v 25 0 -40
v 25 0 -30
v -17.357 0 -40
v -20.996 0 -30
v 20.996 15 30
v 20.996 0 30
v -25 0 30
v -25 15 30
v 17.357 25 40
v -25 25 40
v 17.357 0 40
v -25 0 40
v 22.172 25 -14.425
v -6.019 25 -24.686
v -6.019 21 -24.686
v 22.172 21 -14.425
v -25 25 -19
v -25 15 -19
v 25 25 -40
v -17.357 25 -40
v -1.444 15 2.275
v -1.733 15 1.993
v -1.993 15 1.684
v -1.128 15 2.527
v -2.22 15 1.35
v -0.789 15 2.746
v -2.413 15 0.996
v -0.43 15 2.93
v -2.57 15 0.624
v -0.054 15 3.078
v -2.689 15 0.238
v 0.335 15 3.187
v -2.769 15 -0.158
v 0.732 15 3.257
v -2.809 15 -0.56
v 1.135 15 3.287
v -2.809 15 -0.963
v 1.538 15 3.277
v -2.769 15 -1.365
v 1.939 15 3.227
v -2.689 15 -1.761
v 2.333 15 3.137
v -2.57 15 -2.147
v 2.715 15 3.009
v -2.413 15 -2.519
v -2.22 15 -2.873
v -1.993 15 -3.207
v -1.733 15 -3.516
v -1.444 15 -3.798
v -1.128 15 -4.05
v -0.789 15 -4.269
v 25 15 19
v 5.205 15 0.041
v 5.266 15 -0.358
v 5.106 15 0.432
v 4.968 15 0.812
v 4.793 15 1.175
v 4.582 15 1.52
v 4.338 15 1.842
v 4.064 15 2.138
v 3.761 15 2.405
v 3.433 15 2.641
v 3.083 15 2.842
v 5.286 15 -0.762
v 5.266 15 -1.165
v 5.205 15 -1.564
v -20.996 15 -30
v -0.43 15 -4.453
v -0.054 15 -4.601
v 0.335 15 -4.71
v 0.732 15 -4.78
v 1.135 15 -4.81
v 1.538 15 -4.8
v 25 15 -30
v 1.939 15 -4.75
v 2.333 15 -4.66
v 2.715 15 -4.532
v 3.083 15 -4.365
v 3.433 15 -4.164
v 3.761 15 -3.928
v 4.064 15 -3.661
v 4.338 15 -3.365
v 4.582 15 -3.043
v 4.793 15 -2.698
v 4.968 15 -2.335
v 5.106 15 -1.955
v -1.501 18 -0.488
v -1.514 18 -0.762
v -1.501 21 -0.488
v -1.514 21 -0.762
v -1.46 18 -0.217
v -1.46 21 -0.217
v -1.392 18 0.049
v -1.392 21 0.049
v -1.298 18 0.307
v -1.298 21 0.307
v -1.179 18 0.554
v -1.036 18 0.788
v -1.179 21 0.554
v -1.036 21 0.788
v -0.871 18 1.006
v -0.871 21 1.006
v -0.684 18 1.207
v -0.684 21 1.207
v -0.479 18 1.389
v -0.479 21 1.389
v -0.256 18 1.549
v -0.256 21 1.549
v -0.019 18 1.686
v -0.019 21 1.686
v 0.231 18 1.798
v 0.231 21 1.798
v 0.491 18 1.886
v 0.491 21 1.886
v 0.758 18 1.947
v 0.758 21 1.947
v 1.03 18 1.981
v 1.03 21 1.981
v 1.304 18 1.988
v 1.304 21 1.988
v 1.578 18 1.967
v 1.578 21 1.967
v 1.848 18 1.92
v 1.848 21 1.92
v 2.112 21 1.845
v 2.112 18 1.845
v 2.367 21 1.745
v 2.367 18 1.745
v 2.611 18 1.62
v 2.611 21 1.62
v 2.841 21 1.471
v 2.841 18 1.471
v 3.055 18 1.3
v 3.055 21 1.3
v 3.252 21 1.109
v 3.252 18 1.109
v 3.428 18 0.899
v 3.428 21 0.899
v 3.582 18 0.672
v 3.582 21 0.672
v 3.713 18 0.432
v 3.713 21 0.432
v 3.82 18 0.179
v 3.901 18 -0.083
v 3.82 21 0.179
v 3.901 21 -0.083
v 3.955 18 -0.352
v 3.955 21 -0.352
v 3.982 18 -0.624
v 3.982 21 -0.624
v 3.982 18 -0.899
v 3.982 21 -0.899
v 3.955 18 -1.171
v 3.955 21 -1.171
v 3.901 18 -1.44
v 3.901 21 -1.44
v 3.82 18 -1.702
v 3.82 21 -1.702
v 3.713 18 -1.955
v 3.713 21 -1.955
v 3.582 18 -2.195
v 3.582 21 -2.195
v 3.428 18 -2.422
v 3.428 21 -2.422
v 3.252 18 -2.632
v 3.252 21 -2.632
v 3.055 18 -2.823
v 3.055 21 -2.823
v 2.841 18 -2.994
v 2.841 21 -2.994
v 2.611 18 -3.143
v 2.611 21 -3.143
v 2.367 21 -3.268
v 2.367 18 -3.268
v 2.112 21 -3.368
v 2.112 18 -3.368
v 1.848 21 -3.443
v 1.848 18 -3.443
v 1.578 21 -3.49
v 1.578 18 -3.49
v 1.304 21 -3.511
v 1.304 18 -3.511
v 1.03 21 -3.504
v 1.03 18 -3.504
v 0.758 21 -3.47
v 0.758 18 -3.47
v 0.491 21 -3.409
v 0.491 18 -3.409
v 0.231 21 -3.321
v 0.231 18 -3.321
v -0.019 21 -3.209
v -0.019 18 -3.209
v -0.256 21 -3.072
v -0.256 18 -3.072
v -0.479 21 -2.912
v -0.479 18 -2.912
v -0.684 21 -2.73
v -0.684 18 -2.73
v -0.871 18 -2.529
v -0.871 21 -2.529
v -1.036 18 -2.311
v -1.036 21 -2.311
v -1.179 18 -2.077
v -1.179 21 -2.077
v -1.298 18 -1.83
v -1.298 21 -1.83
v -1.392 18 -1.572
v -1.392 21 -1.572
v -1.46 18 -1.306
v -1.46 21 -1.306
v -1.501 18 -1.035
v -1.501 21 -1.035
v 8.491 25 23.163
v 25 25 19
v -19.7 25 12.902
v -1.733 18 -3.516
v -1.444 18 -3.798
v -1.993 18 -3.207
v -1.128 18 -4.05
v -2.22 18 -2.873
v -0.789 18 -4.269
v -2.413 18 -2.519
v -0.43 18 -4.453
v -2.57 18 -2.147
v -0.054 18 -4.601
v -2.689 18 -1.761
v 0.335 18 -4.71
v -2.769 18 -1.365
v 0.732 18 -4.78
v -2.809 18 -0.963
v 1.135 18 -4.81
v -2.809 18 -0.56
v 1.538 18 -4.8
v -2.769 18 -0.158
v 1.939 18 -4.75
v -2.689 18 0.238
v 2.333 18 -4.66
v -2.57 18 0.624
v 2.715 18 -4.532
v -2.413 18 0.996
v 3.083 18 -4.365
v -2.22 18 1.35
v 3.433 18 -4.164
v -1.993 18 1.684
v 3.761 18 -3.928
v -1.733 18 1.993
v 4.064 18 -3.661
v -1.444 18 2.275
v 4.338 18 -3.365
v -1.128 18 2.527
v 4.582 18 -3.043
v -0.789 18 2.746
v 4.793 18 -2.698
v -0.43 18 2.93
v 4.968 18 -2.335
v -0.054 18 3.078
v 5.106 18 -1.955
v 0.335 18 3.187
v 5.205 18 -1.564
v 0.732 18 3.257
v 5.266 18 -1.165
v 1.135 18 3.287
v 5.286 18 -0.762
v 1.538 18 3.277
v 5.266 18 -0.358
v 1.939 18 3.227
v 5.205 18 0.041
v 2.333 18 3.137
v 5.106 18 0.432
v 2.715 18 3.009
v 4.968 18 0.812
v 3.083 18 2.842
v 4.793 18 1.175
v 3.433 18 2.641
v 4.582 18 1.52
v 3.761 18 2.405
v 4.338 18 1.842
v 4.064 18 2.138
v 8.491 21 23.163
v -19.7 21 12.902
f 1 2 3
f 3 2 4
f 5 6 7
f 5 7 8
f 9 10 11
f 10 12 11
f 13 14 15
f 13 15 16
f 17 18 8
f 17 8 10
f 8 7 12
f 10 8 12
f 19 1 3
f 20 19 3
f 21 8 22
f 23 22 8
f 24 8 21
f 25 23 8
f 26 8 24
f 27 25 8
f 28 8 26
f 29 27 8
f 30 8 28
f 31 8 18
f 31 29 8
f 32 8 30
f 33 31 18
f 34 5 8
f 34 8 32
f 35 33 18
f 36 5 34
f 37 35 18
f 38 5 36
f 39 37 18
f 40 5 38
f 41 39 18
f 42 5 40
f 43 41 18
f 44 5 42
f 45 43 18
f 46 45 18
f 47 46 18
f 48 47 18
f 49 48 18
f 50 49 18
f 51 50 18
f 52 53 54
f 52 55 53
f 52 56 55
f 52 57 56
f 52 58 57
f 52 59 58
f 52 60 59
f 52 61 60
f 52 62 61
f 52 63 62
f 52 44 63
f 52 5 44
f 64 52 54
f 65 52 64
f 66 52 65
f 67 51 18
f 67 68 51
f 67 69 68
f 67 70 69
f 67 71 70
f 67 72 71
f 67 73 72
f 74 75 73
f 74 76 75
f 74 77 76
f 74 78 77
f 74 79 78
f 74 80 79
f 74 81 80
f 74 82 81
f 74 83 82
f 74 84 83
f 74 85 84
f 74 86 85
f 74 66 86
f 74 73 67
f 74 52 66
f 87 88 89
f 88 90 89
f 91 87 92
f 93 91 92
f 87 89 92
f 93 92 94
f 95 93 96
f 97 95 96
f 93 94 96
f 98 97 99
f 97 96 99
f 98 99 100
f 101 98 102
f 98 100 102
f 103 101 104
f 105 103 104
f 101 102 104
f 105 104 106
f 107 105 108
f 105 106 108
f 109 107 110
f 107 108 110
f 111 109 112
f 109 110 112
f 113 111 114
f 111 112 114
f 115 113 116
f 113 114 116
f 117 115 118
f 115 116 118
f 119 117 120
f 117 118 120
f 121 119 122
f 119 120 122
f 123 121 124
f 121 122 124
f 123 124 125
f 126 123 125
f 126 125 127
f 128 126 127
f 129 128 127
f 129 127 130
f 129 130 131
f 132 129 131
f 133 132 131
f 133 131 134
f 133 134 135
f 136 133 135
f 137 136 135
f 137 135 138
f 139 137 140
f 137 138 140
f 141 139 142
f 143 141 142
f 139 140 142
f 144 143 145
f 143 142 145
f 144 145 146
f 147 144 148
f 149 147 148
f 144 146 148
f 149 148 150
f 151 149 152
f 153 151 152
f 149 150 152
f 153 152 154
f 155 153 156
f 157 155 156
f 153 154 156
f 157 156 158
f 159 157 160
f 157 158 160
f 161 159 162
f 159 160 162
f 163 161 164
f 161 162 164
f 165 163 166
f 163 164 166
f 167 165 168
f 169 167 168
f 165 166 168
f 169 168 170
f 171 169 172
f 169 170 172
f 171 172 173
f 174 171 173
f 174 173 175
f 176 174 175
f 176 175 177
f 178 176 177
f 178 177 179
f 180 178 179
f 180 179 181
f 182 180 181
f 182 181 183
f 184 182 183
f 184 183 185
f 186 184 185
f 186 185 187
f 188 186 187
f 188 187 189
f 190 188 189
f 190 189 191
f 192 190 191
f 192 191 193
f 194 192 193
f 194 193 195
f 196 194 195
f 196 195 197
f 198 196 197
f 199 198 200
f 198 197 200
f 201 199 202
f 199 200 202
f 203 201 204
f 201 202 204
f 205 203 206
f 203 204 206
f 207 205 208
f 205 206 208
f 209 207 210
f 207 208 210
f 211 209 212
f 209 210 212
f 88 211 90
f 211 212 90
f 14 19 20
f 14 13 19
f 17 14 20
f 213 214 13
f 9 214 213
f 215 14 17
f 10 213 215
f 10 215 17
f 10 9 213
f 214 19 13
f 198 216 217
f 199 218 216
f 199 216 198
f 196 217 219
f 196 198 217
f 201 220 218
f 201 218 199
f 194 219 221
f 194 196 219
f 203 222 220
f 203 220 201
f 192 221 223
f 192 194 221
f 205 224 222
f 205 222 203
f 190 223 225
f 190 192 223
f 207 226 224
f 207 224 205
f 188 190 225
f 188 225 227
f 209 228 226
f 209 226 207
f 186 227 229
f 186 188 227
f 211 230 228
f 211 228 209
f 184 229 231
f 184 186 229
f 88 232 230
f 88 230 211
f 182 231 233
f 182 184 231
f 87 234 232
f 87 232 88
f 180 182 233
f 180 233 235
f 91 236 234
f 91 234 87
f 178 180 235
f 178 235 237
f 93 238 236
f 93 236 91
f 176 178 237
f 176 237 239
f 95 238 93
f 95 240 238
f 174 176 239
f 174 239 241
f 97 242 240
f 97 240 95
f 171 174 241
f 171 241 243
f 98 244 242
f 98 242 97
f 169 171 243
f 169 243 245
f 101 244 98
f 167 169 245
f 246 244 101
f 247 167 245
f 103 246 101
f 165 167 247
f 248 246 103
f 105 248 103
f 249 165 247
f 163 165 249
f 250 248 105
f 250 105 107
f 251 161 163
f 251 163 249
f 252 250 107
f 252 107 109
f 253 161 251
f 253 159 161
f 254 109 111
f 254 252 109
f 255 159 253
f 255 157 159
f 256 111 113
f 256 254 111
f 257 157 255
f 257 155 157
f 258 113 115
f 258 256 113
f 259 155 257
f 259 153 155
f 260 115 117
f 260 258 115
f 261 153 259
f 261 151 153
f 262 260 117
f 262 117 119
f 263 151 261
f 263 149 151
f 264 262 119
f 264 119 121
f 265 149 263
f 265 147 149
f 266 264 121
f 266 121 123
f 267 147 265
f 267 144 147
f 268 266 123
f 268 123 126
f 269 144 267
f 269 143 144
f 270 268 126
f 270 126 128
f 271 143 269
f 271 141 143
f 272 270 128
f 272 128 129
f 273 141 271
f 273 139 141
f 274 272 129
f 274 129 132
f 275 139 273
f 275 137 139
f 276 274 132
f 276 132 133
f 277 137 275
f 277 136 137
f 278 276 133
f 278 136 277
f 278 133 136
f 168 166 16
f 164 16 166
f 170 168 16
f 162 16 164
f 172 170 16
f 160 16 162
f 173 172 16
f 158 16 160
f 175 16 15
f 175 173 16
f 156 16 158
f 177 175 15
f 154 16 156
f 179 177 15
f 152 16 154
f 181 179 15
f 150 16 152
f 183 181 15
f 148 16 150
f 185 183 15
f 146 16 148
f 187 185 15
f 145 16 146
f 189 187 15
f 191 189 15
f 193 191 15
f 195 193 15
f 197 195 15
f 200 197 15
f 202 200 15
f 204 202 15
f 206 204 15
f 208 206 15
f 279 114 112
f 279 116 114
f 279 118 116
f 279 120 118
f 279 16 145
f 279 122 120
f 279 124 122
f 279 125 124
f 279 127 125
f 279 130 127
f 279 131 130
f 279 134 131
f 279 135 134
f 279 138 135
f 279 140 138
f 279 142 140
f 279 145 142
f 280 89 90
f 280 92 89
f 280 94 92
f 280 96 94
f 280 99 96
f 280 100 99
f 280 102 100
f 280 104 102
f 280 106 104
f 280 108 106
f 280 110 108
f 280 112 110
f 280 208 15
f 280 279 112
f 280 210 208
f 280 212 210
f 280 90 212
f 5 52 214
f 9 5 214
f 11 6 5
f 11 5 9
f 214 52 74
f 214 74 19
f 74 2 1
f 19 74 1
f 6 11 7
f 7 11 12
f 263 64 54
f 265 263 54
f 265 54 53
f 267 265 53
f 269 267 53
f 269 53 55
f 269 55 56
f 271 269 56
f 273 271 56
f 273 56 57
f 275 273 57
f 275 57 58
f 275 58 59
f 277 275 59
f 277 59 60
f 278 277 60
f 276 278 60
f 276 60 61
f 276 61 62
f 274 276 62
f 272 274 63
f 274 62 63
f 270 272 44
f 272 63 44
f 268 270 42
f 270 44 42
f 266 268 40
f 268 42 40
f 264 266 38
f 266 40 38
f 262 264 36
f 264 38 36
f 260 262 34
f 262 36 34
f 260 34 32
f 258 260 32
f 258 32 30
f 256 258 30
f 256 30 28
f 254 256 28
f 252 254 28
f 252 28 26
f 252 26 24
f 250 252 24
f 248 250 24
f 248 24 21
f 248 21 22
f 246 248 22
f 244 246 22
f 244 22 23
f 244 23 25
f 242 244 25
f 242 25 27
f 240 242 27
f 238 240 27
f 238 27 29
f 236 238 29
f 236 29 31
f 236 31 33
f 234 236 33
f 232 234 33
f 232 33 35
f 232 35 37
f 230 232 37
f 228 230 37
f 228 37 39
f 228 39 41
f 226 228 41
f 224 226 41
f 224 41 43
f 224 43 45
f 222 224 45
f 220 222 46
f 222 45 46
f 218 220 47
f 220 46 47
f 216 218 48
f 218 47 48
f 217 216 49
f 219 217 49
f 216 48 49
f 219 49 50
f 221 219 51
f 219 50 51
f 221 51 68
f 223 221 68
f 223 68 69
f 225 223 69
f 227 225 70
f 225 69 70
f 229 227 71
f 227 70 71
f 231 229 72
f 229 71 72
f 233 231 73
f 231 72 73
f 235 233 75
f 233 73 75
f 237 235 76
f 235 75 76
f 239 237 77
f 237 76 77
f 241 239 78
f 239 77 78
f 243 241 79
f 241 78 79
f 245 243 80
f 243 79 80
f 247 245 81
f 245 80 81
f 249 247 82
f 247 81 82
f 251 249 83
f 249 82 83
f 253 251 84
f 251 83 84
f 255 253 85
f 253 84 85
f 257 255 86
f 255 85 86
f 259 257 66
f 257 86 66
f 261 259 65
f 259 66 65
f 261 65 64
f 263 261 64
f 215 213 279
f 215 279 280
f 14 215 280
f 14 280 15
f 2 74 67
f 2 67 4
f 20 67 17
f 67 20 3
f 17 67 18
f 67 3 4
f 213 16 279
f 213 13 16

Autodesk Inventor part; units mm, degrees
sketch "Sketch1" plane through (0, 0, 0) normal (0, 1, 0) x (-1, 0, 0)
  line L0 (-25, -40) -> (25, -40) construction
  line L1 (25, -40) -> (25, 40) construction
  line L2 (25, 40) -> (-25, 40) construction
  line L3 (-25, 40) -> (-25, -40) construction
  line L4 (-25, 19) -> (-17.3566, 40)
  line L5 (17.3566, -40) -> (25, -19)
  line L6 (25, -19) -> (25, 40)
  line L7 (25, 40) -> (-17.3566, 40)
  line L8 (-25, 19) -> (-25, -40)
  line L9 (-25, -40) -> (17.3566, -40)
  point P0 (0, 0)
  point P1 (25, 0)
  point P2 (0, -40)
  dimension "d0" = 50
  dimension "d1" = 80
  dimension "d2" = 21
  dimension "d3" = 20
  dimension "d4" = 20
  dimension "d5" = 21
extrude "Extrusion1" add sketch "Sketch1" along normal blind 25
ref_plane "Work Plane1" through (25.25, 0, 0) normal (1, 0, 0) x (0, 1, 0)
sketch "Sketch2" plane through (25.25, 0, 0) normal (1, 0, 0) x (0, 1, 0)
  line L0 (0, 40) -> (0, 19) construction
  line L1 (0, 19) -> (25, 19) construction
  line L2 (25, 40) -> (25, 19) construction
  line L3 (0, 40) -> (25, 40) construction
  line L4 (0, 19) -> (0, -40) construction
  line L5 (0, -40) -> (25, -40) construction
  line L6 (25, 19) -> (25, -40) construction
  line L7 (0, 19) -> (25, 19) construction
  line L8 (0, 30) -> (0, -30)
  line L9 (0, 30) -> (15, 30)
  line L10 (15, 30) -> (15, -30)
  line L11 (15, -30) -> (0, -30)
  point P0 (0, 0)
  dimension "d9" = 60
  dimension "d10" = 10
  dimension "d11" = 15
extrude "Extrusion2" cut sketch "Sketch2" against normal through all
ref_plane "Work Plane2" through (0, 25, 0) normal (0, 1, 0) x (-1, 0, 0)
sketch "Sketch3" plane through (0, 25, 0) normal (0, 1, 0) x (-1, 0, 0)
  line L0 (17.3566, -40) -> (25, -19) construction
  line L1 (25, -19) -> (25, 40) construction
  line L2 (25, 40) -> (-17.3566, 40) construction
  line L3 (-17.3566, 40) -> (-25, 19) construction
  line L4 (-25, 19) -> (-25, -40) construction
  line L5 (-25, -40) -> (17.3566, -40) construction
  line L6 (6.0192, -24.6856) -> (-22.1716, -14.425)
  line L7 (-22.1716, -14.425) -> (-8.4908, 23.1627)
  line L8 (-8.4908, 23.1627) -> (19.7, 12.9021)
  line L9 (19.7, 12.9021) -> (6.0192, -24.6856)
  point P0 (0, 0)
  dimension "d15" = 30
  dimension "d16" = 40
  dimension "d17" = 30
  dimension "d18" = 25
  dimension "d19" = 70
  dimension "d20" = 5.3
extrude "Extrusion3" cut sketch "Sketch3" against normal blind 4
ref_plane "Work Plane3" through (0, 21, 0) normal (0, 1, 0) x (-1, 0, 0)
sketch "Sketch4" plane through (0, 21, 0) normal (0, 1, 0) x (-1, 0, 0)
  line L0 (-22.1716, -14.425) -> (-8.4908, 23.1627) construction
  line L1 (-8.4908, 23.1627) -> (19.7, 12.9021) construction
  line L2 (19.7, 12.9021) -> (6.0192, -24.6856) construction
  line L3 (6.0192, -24.6856) -> (-22.1716, -14.425) construction
  line L4 (17.3566, -40) -> (25, -19) construction
  line L5 (25, -19) -> (25, 40) construction
  line L6 (25, 40) -> (-17.3566, 40) construction
  line L7 (-17.3566, 40) -> (-25, 19) construction
  line L8 (-25, 19) -> (-25, -40) construction
  line L9 (-25, -40) -> (17.3566, -40) construction
  line L10 (-8.0762, -19.5553) -> (5.6046, 18.0324) construction
  line L11 (12.8596, -5.8918) -> (-15.3312, 4.3688) construction
  circle A0 centre (-1.2358, -0.7615) radius 2.75
  point P0 (0, 0)
  dimension "d24" = 5.5
extrude "Extrusion4" cut sketch "Sketch4" against normal through all
sketch "Sketch5" plane through (-25, 15, 30) normal (0, -1, 0) x (1, 0, 0)
  circle A0 centre (26.2358, -30.7615) radius 2.75 construction
  circle A1 centre (26.2358, -30.7615) radius 4.05
  point P0 (25, -30)
  dimension "d27" = 8.1
extrude "Extrusion5" cut sketch "Sketch5" against normal blind 3
properties part number "base_obj3"
